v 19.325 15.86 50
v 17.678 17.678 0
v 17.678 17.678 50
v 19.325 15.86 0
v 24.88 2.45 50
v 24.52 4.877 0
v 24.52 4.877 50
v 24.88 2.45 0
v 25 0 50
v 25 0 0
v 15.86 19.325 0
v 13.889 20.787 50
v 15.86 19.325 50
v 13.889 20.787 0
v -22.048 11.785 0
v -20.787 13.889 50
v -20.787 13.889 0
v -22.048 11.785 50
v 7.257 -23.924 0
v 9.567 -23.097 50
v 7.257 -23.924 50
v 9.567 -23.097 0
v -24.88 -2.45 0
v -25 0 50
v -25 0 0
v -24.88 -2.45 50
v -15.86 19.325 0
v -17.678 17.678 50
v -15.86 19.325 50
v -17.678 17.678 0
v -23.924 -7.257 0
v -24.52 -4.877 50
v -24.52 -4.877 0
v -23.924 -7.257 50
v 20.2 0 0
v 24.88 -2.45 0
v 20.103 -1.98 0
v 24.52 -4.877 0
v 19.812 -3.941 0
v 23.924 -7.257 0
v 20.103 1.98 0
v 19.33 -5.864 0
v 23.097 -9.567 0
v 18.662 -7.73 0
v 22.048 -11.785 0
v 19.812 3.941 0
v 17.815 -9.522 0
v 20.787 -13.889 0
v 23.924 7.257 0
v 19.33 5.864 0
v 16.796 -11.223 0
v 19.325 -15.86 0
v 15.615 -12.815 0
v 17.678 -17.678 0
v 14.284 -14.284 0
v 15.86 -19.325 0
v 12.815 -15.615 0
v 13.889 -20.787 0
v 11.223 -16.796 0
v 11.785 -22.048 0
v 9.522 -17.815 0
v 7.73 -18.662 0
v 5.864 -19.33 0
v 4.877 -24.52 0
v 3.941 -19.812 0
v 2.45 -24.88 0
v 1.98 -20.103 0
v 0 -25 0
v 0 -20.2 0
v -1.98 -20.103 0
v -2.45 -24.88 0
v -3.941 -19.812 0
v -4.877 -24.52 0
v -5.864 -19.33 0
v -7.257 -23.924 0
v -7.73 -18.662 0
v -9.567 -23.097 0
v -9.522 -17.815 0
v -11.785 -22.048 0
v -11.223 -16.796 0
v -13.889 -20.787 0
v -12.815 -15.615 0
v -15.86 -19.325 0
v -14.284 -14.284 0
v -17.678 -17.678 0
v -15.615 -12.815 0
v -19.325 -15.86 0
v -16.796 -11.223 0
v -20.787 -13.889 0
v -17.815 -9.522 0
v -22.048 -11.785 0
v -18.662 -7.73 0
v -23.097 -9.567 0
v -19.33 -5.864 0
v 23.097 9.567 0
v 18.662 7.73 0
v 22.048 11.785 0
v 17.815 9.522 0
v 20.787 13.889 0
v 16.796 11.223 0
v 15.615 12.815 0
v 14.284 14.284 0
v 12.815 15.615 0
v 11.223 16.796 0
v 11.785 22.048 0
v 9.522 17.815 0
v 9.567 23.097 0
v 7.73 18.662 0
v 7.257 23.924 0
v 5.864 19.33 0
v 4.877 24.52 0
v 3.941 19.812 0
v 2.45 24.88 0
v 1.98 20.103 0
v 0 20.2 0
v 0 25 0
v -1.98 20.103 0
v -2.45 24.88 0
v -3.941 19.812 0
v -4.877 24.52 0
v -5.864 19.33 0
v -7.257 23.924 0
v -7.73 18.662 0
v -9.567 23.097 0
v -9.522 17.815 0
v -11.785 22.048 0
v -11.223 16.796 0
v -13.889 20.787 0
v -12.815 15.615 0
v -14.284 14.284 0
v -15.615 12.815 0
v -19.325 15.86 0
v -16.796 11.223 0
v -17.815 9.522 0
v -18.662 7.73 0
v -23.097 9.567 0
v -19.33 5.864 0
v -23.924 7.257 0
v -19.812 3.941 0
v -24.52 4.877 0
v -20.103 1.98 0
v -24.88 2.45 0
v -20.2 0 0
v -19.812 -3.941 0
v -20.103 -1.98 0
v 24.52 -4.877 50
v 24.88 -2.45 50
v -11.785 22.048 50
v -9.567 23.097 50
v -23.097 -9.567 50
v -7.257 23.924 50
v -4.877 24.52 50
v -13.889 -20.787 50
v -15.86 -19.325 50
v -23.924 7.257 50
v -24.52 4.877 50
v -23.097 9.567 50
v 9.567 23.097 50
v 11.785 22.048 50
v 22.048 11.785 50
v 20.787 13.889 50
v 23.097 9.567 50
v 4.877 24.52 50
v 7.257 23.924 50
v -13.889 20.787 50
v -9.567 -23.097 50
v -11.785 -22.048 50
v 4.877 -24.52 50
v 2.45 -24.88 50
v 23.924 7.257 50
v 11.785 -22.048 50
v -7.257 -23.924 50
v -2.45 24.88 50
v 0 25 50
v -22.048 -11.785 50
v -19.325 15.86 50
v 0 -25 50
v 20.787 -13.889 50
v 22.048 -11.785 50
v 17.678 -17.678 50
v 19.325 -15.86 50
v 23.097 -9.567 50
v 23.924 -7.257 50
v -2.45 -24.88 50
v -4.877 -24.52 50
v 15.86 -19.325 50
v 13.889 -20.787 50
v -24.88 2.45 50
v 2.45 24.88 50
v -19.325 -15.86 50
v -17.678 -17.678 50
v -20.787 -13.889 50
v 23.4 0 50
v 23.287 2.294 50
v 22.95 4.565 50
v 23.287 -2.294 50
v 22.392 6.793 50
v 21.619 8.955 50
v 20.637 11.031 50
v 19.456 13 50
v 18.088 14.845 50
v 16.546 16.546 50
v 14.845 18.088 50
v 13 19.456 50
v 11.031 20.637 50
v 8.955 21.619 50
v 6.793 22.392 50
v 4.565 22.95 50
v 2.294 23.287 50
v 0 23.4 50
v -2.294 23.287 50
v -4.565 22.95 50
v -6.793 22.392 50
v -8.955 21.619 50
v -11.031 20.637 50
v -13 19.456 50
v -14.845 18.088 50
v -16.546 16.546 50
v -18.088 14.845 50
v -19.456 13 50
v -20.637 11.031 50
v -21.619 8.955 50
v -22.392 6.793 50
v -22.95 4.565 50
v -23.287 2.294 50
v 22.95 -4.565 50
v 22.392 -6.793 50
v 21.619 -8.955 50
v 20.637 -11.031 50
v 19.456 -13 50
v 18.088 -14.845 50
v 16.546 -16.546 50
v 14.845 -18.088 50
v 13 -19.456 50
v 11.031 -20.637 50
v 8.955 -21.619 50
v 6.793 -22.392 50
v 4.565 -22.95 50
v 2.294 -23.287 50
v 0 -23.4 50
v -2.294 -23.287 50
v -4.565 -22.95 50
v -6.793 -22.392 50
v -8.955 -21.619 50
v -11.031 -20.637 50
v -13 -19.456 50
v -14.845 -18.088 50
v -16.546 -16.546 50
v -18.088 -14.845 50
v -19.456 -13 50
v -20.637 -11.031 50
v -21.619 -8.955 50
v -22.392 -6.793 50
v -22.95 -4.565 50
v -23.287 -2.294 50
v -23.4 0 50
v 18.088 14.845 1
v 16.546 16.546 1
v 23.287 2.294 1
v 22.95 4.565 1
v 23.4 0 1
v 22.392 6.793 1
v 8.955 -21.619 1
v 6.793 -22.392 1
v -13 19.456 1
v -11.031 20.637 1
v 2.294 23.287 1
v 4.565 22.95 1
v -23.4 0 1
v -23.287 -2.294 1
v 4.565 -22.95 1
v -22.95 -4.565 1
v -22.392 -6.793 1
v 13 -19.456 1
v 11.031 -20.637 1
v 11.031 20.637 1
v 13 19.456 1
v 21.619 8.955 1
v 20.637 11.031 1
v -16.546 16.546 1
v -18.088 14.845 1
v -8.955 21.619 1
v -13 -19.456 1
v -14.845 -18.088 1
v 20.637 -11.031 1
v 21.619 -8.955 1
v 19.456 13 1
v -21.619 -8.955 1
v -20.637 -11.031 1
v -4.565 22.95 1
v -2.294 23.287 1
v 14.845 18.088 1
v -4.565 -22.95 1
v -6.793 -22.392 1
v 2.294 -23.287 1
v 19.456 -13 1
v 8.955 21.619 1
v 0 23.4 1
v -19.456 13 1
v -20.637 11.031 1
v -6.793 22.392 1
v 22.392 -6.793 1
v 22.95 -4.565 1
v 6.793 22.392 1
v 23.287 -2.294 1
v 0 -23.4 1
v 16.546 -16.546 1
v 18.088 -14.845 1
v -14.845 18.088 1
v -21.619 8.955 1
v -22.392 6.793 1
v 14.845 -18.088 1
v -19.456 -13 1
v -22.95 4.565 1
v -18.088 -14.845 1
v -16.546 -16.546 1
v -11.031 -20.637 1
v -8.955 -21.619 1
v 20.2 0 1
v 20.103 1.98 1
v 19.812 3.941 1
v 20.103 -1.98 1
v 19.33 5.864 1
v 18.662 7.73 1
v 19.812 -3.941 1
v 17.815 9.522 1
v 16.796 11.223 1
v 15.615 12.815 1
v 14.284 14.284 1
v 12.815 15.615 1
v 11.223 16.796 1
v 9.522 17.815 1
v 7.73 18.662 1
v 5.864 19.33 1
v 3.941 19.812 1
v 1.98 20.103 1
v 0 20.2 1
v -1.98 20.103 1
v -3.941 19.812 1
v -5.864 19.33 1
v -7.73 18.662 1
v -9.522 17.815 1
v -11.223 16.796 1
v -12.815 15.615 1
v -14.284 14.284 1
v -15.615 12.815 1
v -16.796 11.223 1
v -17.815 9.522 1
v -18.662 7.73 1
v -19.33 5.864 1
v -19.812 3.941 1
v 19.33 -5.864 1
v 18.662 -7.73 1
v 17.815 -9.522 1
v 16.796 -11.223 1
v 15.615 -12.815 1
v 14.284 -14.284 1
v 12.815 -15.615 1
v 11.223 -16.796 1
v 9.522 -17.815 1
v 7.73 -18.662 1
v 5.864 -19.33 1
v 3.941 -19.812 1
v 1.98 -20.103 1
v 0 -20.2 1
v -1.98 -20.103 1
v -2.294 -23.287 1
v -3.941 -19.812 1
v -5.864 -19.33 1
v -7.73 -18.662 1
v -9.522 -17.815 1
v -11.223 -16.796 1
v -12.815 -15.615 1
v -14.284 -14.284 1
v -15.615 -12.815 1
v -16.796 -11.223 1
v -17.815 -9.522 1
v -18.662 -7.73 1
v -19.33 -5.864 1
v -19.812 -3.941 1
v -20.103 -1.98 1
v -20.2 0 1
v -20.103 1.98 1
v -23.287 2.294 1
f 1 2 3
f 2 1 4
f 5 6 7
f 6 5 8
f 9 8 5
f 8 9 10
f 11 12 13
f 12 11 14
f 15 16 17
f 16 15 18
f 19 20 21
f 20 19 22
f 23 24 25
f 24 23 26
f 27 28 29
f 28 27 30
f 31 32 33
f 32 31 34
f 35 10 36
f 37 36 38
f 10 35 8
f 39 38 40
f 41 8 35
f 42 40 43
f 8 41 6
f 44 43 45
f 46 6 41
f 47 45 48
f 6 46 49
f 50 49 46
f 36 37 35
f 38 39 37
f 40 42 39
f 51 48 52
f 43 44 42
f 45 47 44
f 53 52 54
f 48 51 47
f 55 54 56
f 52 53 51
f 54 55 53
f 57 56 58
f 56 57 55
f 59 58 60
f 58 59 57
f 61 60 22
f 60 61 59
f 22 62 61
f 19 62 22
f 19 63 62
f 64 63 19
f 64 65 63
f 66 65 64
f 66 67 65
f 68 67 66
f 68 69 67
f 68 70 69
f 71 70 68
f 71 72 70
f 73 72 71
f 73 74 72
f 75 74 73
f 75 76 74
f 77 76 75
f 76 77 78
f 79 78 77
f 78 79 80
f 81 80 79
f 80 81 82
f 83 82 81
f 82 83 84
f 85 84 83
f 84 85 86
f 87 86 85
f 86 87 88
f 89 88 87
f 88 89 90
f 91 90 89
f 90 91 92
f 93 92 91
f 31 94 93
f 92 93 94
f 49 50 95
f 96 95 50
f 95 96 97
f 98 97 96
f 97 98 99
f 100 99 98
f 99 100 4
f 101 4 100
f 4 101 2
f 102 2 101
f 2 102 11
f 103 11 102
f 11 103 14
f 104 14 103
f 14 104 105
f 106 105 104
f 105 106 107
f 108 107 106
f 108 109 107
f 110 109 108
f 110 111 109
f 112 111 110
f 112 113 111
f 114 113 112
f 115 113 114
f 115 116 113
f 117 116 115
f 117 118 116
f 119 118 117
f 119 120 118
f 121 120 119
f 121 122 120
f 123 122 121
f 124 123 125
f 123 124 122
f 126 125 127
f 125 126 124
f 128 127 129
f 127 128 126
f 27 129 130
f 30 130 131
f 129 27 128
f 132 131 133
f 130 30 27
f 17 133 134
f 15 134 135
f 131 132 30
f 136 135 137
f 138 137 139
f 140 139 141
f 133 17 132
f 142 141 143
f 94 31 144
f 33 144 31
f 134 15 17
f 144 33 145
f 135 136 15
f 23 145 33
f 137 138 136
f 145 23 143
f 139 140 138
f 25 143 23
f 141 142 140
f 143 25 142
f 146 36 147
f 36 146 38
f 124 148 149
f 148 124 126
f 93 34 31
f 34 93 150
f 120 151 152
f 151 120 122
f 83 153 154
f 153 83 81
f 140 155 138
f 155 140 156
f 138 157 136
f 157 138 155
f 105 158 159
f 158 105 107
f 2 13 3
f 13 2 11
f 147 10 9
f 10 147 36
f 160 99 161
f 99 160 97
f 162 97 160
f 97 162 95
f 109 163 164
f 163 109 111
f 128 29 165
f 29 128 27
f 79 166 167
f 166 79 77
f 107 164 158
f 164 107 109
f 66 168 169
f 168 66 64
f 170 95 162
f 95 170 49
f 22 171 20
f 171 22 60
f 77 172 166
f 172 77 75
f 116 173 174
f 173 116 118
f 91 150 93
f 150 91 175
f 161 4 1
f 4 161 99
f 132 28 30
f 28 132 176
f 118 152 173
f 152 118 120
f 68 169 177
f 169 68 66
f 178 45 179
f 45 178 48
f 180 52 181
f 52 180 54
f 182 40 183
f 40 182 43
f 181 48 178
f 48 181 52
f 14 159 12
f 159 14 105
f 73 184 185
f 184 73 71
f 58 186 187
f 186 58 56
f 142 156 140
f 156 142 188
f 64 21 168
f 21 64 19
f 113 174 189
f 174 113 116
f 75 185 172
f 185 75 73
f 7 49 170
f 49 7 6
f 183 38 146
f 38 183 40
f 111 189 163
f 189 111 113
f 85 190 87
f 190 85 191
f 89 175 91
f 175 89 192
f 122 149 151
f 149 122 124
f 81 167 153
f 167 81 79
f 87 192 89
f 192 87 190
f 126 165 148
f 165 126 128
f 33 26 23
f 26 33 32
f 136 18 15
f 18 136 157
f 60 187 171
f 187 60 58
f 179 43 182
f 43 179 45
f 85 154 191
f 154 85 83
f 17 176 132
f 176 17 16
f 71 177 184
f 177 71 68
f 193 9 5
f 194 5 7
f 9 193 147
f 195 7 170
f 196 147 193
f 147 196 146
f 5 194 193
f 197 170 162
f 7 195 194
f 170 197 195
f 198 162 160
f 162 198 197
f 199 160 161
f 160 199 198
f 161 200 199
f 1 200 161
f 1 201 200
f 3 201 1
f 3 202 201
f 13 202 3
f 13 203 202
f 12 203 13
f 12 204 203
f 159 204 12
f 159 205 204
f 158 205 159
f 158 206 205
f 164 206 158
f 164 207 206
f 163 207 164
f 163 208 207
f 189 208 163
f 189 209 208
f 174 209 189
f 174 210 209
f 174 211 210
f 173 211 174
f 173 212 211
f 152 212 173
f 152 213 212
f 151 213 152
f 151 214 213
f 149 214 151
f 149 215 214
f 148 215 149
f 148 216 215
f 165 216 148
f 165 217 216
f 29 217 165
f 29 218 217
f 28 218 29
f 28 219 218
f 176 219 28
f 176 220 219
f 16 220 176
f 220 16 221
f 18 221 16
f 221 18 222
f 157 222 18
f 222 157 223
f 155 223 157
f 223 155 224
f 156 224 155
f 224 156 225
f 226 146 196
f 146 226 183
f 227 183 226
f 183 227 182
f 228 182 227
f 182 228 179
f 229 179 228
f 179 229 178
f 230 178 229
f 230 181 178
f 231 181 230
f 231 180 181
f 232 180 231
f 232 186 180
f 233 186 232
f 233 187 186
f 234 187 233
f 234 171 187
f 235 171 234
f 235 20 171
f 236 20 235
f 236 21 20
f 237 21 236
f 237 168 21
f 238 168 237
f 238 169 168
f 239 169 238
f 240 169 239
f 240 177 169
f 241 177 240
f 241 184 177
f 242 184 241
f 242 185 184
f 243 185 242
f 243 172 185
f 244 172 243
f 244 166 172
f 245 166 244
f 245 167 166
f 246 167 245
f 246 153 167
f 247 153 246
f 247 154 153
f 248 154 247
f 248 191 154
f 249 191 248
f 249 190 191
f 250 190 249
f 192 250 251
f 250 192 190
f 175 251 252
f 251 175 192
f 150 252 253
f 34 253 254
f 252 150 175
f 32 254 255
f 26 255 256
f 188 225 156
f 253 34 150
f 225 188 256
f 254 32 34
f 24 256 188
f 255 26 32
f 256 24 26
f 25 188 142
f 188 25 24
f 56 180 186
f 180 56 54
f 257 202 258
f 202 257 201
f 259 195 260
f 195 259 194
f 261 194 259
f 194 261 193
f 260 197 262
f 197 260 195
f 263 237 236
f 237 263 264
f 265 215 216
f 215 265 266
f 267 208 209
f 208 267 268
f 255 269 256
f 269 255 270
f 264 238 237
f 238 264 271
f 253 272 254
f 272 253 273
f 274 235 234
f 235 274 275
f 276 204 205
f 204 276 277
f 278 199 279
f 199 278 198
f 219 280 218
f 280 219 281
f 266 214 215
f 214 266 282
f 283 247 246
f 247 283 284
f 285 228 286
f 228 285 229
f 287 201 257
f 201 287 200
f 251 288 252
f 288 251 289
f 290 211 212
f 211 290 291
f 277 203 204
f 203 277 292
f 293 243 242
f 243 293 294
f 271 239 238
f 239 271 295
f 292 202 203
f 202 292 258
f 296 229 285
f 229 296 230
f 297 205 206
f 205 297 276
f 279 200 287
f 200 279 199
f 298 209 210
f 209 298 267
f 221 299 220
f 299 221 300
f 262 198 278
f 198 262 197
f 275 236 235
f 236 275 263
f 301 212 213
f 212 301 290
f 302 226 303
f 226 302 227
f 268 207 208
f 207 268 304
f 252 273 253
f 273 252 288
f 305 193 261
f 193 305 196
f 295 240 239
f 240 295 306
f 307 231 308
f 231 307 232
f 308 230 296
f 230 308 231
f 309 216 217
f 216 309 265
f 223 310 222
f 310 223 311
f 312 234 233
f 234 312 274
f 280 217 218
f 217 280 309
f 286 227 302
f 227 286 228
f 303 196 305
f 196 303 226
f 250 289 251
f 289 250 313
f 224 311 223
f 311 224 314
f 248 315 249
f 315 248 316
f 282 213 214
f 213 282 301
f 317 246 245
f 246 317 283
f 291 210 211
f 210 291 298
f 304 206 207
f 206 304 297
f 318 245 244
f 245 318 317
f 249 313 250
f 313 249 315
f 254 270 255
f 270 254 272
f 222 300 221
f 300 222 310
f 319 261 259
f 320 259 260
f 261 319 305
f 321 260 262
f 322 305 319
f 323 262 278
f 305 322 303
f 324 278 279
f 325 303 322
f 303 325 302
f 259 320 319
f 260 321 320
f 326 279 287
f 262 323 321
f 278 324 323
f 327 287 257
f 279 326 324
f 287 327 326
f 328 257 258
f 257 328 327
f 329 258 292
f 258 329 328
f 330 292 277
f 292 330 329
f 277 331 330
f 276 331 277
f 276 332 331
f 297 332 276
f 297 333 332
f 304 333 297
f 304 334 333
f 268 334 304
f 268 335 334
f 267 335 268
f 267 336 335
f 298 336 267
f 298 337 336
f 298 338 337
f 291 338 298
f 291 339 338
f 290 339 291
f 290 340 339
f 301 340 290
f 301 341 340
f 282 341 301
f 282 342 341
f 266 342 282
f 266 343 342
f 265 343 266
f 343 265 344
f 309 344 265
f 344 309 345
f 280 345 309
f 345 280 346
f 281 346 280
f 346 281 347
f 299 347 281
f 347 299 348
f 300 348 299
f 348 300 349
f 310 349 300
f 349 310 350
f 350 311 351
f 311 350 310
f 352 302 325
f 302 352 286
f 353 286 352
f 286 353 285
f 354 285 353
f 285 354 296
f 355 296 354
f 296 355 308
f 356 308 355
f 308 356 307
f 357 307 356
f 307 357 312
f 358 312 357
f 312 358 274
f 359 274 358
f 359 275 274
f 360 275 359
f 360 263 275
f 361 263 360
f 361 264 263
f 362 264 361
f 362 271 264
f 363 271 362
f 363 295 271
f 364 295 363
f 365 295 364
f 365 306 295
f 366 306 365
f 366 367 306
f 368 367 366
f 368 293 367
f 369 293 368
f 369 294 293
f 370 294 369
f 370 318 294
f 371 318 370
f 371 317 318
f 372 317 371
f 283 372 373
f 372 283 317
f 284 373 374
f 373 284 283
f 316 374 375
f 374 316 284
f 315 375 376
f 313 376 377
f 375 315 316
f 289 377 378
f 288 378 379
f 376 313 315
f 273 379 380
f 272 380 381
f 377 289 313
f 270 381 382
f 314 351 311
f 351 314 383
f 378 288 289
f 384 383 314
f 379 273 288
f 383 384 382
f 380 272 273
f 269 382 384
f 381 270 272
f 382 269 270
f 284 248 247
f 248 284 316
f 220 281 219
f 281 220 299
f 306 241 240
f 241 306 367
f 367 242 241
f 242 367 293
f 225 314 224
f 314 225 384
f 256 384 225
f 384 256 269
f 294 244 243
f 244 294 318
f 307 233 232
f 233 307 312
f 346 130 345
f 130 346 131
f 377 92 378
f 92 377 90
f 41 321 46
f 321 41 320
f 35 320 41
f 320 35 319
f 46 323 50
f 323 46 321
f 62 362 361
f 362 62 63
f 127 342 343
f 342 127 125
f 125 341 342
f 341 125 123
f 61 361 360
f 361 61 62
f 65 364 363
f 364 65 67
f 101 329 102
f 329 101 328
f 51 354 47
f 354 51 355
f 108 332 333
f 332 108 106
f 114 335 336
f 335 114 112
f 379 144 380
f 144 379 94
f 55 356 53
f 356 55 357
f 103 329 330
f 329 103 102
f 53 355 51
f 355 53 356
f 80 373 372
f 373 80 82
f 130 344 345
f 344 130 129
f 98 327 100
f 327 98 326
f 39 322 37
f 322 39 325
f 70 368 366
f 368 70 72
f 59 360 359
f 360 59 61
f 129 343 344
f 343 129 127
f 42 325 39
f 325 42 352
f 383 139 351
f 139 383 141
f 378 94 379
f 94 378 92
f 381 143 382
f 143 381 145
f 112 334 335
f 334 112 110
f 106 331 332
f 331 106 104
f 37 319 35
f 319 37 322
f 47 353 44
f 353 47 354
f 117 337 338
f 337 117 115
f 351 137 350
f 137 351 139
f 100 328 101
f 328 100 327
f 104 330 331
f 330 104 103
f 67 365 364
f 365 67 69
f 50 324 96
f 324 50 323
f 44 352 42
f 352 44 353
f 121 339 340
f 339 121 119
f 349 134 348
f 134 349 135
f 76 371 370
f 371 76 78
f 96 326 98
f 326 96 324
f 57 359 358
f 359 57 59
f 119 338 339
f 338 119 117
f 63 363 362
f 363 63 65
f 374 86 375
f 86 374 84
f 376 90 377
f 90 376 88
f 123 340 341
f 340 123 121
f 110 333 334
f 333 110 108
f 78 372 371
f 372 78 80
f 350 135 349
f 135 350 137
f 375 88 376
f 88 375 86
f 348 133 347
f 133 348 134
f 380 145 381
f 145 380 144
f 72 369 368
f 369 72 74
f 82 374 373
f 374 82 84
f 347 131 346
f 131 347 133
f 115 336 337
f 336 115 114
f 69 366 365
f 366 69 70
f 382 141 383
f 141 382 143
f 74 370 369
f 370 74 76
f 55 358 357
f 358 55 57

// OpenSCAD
// file: ../sc.scad
// ShortCuts.scad 
// Autor: Rudolf Huttary, Berlin 2015
//
$fn = 100; 

//show_examples(); 

module show_examples()
	place_in_rect(30, 30)
	{
		Cy(h = 10); 
		CyH(h = 10); 
		CyH(h = 10, w = 30); 
		CyS(h = 10); 
		CyS(h = 10, w1 = 25, w2 = 75); 
		Cu(10); 
		Ri(h = 10); 
		RiH(h = 10); 
		RiS(h = 10, w1 = 10); 
		RiS(h = 10, w1 = 30, w2 = 300); 
		Sp(); 
		SpH(10, 30, 30); 
	}


module help()
{
echo("==============="); 
echo("help(): shows this help"); 
echo("show_examples(): shows some examples"); 
echo("place_in_rect(): places children objects in grid"); 
echo("Transformations:"); 
echo(" transform :  T(x=0, y=0, z=0), Tx(x=0) , Ty(y=0), Tz(z=0)"); 
echo(" rotate :  R(x=0, y=0, z=0), Rx(x=0) , Ry(y=0), Rz(z=0)"); 
echo(" scale :  S(x=1, y=1, z=1), Sx(x=1) , Sy(y=1), Sz(z=1)"); 
echo("Logical"); 
echo(" difference :  D()"); 
echo(" union :  U()"); 
echo(" intersection : *missing*"); 
echo("Primitives"); 
echo(" circle :  Ci(r=10)"); 
echo(" circle_half :  CiH(r=10, w=0)")
echo(" circle_segment :  CiS(r=10, w1=0, w2=90)")
echo(" square :  Sq(x=10, y=0, center=true))"); 
echo(" cylinder :  Cy(r=10, h=1, center=true)"); 
echo(" cylinder_half :  CyH(r=10, w=0)")
echo(" cylinder_segment: CyS(r=10, h=1, w1=0, w2=90,center=true)"); 
echo(" cylinder_segment: Pie(r=10, h=1, w1=0, w2=90,center=true)"); 
echo(" cube :  Cu(x=10, y=0, z=10, center=true)"); 
echo(" ring :  Ri(R=10, r=5, h=1, center=true)"); 
echo(" ring_half :  RiH(R=10, r=5, h=1, w=0 center=true)"); 
echo(" ring_segment :  RiS(R=10, r=5, h=1, w1=0, w2=90, center=true)"); 
echo(" sphere:  Sp(r=10))"); 
echo(" sphere_half:  SpH(r=10, w1 = 0, w2 = 0))"); 
echo("==============="); 
}

// Euclidean Transformations
module T(x=0, y=0, z=0){translate([x, y, z])children(); }
module Tx(x) { translate([x, 0, 0])children(); }
module Ty(y) { translate([0, y, 0])children(); }
module Tz(z) { translate([0, 0, z])children(); }

module R(x=0, y=0, z=0){rotate([x, y, z]) children();}
module Rx(x=90){rotate([x, 0, 0]) children();}
module Ry(y=90){rotate([0, y, 0]) children();}
module Rz(z=90){rotate([0, 0, z]) children();}

module M(x=0, y=0, z=0){mirror([x, y, z]) children();}
module Mx(x=1){mirror([x, 0, 0]) children();}
module My(y=1){mirror([0, y, 0]) children();}
module Mz(z=1){mirror([0, 0, z]) children();}

module S(x=1, y=1, z=1){scale([x, y, z]) children();}
module Sx(x=1){scale([x, 1, 1]) children();}
module Sy(y=1){scale([1, y, 1]) children();}
module Sz(z=1){scale([1, 1, z]) children();}

module D() difference(){children(0); children([1:$children-1]);}
module U() children([0:$children-1]);
// module I() intersection()children([0:$children-1]); // does not work for some reason


// primitives - 2D

module Sq(x =10, y = 0, center = false)
{
   if(y==0)
		square([x, x], center = center); 
	else
		square([x, y], center = center); 
}
module Ci(r = 10)
{
	circle(r = r); 
}

// derived primitives - 2d
module CiH(r = 10, w = 0)
  circle_half(r, w); 

module CiS(r = 10, w1 = 0, w2 = 90)
  circle_segment(r, w1, w2); 


// primitives - 3d
module Cy(r = 10, h = 1, center = false)
{
	cylinder(r = r, h = h, center = center); 
}
module Cu(x = 10, y = 0, z = 10, center = false)
{
  if (y==0)
	cube([x, x, x], center = center); 
  else
	cube([x, y, z], center = center); 
}

// derived primitives - 3d
module CyH(r = 10, h = 1, w = 0, center = false)
  cylinder_half(r, h, w, center); 

module CyS(r = 10, h = 1, w1 = 0, w2 = 90, center = false)
  cylinder_segment(r, h, w1, w2, center); 

module Ri(R = 10, r = 5, h = 1, center = false)
  ring(R, r, h, center); 

module RiS(R = 10, r = 5, h = 1, w1 = 0, w2 = 90, center = false)
   ring_segment(R, r, h, w1, w2, center); 

module RiH(r1 = 10, r2, h = 1, w = 0, center = false)
   ring_half(r1, r2, h, w, center); 
module Pie(r = 10, h = 1, w1 = 0, w2 = 90, center = false)
  cylinder_segment(r, h, w1, w2, center);  
module Sp(r = 10)
  sphere(r); 
module SpH(r = 10, w1 = 0, w2 = 0)
  sphere_half(r, w1, w2); 
module SpS(r = 10, w1 = 0, w2 = 90, w3 = 90)
  sphere_segment(r, w1, w2); 




// clear text definitions
module circle_half(r = 10, w = 0)
{
	difference()
	{
		circle(r); 
     rotate([0, 0, w-90])
     translate([0, -r])
		square([r, 2*r], center = false); 
	}
}

module circle_segment(r = 10, w1 = 0, w2 = 90)
{
  W2 = (w1>w2)?w2+360:w2; 
  if (W2-w1 < 180)
    intersection()
		{
       circle_half(r, w1); 
       circle_half(r, W2-180); 
 		}
	else
    union()
		{
       circle_half(r, w1); 
       circle_half(r, W2-180); 
 		}
}

module cylinder_half(r = 10, h = 1, w = 0, center = true)
{
  linear_extrude(height = h, center = center)
  circle_half(r, w); 
} 

module cylinder_segment(r = 10, h = 1, w1 = 0, w2 = 90, center = true)
{
  linear_extrude(height = h, center = center)
  circle_segment(r, w1, w2); 
} 

module ring(R = 10, r = 5, h = 1, center = true)
{
	difference()
	{
	cylinder(r = R, h = h, center = center); 
   translate([0, 0, -2*h])
	cylinder(r = r, h = 4*h, center = false); 
	}
}

module ring_half(R = 10, r = 5, h = 1, w = 0, center = true)
{
	difference()
	{
		ring(R, r, h, center); 
     rotate([0, 0, w])
     translate([0, -R/2, 0])
		cube([2*R, R, 3*h], center = true); 
	}
}

module ring_segment(R = 10, r = 5, h = 1, w1 = 0, w2 = 90, center = true)
{
  W2 = (w1>w2)?w2+360:w2; 
  if (W2-w1 < 180)
    intersection()
		{
       ring_half(R, r, h, w1, center); 
       ring_half(R, r, h, W2-180, center); 
 		}
	else
    union()
		{
       ring_half(R, r, h, w1, center); 
       ring_half(R, r, h, W2-180, center); 
 		}
}


module sphere_half(r = 10, w1 = 0, w2 = 0)
{  
	difference()
	{
   	sphere(r); 
      rotate([-w1, -w2, 0])
     	translate([0, 0, r])
		cube([2*r, 2*r, r], center = true); 
	}

}


// additional code
module place_in_rect(dx =20, dy=20)
{
  cols = ceil(sqrt($children)); 
  rows = floor(sqrt($children)); 
  for(i = [0:$children-1])
	{ 
	  T(dx*(-cols/2+(i%cols)+.5), dy*(rows/2-floor(i/cols)-.5))
		 children(i); 
	}
}
// main file
use <../lib.scad>
$fn=64;

lineHeigth=0.20;
lineWidth=0.80;

diam=50;
height=50;
width=10;
length=10;
thickxy=1;
thickz=1;

lamp();
//support();

/************************************/
w=multiple(width, lineWidth);
l=multiple(length, lineWidth);
h=multiple(height, lineHeigth);
txy=multiple(thickxy, lineWidth);
tz=multiple(thickz, lineHeigth);
t=txy*2;

module support(){
    difference(){
        union(){             
            translate([diam/2,-t/2,0])
            nccube(l,t,w);

            translate([diam/2+l,t/2,w/2])
            rotate([90,0,0])
            cylinder(d=w*1.15, h=t, $fn=6);            

            translate([diam/2+l,t*.6,0])
            nccube(l*1.5,t,w);

            translate([diam/2+l,t*1.6,w/2])
            rotate([90,0,0])
            cylinder(d=w*1.15, h=t, $fn=6);
        }
        //--------------------------------
        // Hole
        translate([diam/2+l,t*2,w/2])
        rotate([90,0,0])
        cylinder(d=3.5, h=l); 
    }

    translate([diam/2+l*2+t,-w*.51,w/2])
    rotate([0,0,90])
    difference(){
        union(){   
            translate([0,-t,-w/2])
            nccube(l*1,t,w);

            rotate([90,0,0])
            cylinder(d=w*1.15, h=t, $fn=6);
        }
        //--------------------------------
        // Hole
        rotate([90,0,0])
        cylinder(d=3.5, h=l); 
    }
}

module lamp(){
    difference(){
        union(){ 
            cylinder(d=diam, h=h);
            
        }
        //--------------------------------
        translate([0,0,tz])
        cylinder(d=diam-txy*2, h=h*2);

        translate([0,0,-tz])
        cylinder(d=diam-txy*6, h=h*2);
        
        // Hole
        translate([diam/2+l,t,w/2])
        rotate([90,0,0])
        cylinder(d=3.5, h=l); 
    }
}
